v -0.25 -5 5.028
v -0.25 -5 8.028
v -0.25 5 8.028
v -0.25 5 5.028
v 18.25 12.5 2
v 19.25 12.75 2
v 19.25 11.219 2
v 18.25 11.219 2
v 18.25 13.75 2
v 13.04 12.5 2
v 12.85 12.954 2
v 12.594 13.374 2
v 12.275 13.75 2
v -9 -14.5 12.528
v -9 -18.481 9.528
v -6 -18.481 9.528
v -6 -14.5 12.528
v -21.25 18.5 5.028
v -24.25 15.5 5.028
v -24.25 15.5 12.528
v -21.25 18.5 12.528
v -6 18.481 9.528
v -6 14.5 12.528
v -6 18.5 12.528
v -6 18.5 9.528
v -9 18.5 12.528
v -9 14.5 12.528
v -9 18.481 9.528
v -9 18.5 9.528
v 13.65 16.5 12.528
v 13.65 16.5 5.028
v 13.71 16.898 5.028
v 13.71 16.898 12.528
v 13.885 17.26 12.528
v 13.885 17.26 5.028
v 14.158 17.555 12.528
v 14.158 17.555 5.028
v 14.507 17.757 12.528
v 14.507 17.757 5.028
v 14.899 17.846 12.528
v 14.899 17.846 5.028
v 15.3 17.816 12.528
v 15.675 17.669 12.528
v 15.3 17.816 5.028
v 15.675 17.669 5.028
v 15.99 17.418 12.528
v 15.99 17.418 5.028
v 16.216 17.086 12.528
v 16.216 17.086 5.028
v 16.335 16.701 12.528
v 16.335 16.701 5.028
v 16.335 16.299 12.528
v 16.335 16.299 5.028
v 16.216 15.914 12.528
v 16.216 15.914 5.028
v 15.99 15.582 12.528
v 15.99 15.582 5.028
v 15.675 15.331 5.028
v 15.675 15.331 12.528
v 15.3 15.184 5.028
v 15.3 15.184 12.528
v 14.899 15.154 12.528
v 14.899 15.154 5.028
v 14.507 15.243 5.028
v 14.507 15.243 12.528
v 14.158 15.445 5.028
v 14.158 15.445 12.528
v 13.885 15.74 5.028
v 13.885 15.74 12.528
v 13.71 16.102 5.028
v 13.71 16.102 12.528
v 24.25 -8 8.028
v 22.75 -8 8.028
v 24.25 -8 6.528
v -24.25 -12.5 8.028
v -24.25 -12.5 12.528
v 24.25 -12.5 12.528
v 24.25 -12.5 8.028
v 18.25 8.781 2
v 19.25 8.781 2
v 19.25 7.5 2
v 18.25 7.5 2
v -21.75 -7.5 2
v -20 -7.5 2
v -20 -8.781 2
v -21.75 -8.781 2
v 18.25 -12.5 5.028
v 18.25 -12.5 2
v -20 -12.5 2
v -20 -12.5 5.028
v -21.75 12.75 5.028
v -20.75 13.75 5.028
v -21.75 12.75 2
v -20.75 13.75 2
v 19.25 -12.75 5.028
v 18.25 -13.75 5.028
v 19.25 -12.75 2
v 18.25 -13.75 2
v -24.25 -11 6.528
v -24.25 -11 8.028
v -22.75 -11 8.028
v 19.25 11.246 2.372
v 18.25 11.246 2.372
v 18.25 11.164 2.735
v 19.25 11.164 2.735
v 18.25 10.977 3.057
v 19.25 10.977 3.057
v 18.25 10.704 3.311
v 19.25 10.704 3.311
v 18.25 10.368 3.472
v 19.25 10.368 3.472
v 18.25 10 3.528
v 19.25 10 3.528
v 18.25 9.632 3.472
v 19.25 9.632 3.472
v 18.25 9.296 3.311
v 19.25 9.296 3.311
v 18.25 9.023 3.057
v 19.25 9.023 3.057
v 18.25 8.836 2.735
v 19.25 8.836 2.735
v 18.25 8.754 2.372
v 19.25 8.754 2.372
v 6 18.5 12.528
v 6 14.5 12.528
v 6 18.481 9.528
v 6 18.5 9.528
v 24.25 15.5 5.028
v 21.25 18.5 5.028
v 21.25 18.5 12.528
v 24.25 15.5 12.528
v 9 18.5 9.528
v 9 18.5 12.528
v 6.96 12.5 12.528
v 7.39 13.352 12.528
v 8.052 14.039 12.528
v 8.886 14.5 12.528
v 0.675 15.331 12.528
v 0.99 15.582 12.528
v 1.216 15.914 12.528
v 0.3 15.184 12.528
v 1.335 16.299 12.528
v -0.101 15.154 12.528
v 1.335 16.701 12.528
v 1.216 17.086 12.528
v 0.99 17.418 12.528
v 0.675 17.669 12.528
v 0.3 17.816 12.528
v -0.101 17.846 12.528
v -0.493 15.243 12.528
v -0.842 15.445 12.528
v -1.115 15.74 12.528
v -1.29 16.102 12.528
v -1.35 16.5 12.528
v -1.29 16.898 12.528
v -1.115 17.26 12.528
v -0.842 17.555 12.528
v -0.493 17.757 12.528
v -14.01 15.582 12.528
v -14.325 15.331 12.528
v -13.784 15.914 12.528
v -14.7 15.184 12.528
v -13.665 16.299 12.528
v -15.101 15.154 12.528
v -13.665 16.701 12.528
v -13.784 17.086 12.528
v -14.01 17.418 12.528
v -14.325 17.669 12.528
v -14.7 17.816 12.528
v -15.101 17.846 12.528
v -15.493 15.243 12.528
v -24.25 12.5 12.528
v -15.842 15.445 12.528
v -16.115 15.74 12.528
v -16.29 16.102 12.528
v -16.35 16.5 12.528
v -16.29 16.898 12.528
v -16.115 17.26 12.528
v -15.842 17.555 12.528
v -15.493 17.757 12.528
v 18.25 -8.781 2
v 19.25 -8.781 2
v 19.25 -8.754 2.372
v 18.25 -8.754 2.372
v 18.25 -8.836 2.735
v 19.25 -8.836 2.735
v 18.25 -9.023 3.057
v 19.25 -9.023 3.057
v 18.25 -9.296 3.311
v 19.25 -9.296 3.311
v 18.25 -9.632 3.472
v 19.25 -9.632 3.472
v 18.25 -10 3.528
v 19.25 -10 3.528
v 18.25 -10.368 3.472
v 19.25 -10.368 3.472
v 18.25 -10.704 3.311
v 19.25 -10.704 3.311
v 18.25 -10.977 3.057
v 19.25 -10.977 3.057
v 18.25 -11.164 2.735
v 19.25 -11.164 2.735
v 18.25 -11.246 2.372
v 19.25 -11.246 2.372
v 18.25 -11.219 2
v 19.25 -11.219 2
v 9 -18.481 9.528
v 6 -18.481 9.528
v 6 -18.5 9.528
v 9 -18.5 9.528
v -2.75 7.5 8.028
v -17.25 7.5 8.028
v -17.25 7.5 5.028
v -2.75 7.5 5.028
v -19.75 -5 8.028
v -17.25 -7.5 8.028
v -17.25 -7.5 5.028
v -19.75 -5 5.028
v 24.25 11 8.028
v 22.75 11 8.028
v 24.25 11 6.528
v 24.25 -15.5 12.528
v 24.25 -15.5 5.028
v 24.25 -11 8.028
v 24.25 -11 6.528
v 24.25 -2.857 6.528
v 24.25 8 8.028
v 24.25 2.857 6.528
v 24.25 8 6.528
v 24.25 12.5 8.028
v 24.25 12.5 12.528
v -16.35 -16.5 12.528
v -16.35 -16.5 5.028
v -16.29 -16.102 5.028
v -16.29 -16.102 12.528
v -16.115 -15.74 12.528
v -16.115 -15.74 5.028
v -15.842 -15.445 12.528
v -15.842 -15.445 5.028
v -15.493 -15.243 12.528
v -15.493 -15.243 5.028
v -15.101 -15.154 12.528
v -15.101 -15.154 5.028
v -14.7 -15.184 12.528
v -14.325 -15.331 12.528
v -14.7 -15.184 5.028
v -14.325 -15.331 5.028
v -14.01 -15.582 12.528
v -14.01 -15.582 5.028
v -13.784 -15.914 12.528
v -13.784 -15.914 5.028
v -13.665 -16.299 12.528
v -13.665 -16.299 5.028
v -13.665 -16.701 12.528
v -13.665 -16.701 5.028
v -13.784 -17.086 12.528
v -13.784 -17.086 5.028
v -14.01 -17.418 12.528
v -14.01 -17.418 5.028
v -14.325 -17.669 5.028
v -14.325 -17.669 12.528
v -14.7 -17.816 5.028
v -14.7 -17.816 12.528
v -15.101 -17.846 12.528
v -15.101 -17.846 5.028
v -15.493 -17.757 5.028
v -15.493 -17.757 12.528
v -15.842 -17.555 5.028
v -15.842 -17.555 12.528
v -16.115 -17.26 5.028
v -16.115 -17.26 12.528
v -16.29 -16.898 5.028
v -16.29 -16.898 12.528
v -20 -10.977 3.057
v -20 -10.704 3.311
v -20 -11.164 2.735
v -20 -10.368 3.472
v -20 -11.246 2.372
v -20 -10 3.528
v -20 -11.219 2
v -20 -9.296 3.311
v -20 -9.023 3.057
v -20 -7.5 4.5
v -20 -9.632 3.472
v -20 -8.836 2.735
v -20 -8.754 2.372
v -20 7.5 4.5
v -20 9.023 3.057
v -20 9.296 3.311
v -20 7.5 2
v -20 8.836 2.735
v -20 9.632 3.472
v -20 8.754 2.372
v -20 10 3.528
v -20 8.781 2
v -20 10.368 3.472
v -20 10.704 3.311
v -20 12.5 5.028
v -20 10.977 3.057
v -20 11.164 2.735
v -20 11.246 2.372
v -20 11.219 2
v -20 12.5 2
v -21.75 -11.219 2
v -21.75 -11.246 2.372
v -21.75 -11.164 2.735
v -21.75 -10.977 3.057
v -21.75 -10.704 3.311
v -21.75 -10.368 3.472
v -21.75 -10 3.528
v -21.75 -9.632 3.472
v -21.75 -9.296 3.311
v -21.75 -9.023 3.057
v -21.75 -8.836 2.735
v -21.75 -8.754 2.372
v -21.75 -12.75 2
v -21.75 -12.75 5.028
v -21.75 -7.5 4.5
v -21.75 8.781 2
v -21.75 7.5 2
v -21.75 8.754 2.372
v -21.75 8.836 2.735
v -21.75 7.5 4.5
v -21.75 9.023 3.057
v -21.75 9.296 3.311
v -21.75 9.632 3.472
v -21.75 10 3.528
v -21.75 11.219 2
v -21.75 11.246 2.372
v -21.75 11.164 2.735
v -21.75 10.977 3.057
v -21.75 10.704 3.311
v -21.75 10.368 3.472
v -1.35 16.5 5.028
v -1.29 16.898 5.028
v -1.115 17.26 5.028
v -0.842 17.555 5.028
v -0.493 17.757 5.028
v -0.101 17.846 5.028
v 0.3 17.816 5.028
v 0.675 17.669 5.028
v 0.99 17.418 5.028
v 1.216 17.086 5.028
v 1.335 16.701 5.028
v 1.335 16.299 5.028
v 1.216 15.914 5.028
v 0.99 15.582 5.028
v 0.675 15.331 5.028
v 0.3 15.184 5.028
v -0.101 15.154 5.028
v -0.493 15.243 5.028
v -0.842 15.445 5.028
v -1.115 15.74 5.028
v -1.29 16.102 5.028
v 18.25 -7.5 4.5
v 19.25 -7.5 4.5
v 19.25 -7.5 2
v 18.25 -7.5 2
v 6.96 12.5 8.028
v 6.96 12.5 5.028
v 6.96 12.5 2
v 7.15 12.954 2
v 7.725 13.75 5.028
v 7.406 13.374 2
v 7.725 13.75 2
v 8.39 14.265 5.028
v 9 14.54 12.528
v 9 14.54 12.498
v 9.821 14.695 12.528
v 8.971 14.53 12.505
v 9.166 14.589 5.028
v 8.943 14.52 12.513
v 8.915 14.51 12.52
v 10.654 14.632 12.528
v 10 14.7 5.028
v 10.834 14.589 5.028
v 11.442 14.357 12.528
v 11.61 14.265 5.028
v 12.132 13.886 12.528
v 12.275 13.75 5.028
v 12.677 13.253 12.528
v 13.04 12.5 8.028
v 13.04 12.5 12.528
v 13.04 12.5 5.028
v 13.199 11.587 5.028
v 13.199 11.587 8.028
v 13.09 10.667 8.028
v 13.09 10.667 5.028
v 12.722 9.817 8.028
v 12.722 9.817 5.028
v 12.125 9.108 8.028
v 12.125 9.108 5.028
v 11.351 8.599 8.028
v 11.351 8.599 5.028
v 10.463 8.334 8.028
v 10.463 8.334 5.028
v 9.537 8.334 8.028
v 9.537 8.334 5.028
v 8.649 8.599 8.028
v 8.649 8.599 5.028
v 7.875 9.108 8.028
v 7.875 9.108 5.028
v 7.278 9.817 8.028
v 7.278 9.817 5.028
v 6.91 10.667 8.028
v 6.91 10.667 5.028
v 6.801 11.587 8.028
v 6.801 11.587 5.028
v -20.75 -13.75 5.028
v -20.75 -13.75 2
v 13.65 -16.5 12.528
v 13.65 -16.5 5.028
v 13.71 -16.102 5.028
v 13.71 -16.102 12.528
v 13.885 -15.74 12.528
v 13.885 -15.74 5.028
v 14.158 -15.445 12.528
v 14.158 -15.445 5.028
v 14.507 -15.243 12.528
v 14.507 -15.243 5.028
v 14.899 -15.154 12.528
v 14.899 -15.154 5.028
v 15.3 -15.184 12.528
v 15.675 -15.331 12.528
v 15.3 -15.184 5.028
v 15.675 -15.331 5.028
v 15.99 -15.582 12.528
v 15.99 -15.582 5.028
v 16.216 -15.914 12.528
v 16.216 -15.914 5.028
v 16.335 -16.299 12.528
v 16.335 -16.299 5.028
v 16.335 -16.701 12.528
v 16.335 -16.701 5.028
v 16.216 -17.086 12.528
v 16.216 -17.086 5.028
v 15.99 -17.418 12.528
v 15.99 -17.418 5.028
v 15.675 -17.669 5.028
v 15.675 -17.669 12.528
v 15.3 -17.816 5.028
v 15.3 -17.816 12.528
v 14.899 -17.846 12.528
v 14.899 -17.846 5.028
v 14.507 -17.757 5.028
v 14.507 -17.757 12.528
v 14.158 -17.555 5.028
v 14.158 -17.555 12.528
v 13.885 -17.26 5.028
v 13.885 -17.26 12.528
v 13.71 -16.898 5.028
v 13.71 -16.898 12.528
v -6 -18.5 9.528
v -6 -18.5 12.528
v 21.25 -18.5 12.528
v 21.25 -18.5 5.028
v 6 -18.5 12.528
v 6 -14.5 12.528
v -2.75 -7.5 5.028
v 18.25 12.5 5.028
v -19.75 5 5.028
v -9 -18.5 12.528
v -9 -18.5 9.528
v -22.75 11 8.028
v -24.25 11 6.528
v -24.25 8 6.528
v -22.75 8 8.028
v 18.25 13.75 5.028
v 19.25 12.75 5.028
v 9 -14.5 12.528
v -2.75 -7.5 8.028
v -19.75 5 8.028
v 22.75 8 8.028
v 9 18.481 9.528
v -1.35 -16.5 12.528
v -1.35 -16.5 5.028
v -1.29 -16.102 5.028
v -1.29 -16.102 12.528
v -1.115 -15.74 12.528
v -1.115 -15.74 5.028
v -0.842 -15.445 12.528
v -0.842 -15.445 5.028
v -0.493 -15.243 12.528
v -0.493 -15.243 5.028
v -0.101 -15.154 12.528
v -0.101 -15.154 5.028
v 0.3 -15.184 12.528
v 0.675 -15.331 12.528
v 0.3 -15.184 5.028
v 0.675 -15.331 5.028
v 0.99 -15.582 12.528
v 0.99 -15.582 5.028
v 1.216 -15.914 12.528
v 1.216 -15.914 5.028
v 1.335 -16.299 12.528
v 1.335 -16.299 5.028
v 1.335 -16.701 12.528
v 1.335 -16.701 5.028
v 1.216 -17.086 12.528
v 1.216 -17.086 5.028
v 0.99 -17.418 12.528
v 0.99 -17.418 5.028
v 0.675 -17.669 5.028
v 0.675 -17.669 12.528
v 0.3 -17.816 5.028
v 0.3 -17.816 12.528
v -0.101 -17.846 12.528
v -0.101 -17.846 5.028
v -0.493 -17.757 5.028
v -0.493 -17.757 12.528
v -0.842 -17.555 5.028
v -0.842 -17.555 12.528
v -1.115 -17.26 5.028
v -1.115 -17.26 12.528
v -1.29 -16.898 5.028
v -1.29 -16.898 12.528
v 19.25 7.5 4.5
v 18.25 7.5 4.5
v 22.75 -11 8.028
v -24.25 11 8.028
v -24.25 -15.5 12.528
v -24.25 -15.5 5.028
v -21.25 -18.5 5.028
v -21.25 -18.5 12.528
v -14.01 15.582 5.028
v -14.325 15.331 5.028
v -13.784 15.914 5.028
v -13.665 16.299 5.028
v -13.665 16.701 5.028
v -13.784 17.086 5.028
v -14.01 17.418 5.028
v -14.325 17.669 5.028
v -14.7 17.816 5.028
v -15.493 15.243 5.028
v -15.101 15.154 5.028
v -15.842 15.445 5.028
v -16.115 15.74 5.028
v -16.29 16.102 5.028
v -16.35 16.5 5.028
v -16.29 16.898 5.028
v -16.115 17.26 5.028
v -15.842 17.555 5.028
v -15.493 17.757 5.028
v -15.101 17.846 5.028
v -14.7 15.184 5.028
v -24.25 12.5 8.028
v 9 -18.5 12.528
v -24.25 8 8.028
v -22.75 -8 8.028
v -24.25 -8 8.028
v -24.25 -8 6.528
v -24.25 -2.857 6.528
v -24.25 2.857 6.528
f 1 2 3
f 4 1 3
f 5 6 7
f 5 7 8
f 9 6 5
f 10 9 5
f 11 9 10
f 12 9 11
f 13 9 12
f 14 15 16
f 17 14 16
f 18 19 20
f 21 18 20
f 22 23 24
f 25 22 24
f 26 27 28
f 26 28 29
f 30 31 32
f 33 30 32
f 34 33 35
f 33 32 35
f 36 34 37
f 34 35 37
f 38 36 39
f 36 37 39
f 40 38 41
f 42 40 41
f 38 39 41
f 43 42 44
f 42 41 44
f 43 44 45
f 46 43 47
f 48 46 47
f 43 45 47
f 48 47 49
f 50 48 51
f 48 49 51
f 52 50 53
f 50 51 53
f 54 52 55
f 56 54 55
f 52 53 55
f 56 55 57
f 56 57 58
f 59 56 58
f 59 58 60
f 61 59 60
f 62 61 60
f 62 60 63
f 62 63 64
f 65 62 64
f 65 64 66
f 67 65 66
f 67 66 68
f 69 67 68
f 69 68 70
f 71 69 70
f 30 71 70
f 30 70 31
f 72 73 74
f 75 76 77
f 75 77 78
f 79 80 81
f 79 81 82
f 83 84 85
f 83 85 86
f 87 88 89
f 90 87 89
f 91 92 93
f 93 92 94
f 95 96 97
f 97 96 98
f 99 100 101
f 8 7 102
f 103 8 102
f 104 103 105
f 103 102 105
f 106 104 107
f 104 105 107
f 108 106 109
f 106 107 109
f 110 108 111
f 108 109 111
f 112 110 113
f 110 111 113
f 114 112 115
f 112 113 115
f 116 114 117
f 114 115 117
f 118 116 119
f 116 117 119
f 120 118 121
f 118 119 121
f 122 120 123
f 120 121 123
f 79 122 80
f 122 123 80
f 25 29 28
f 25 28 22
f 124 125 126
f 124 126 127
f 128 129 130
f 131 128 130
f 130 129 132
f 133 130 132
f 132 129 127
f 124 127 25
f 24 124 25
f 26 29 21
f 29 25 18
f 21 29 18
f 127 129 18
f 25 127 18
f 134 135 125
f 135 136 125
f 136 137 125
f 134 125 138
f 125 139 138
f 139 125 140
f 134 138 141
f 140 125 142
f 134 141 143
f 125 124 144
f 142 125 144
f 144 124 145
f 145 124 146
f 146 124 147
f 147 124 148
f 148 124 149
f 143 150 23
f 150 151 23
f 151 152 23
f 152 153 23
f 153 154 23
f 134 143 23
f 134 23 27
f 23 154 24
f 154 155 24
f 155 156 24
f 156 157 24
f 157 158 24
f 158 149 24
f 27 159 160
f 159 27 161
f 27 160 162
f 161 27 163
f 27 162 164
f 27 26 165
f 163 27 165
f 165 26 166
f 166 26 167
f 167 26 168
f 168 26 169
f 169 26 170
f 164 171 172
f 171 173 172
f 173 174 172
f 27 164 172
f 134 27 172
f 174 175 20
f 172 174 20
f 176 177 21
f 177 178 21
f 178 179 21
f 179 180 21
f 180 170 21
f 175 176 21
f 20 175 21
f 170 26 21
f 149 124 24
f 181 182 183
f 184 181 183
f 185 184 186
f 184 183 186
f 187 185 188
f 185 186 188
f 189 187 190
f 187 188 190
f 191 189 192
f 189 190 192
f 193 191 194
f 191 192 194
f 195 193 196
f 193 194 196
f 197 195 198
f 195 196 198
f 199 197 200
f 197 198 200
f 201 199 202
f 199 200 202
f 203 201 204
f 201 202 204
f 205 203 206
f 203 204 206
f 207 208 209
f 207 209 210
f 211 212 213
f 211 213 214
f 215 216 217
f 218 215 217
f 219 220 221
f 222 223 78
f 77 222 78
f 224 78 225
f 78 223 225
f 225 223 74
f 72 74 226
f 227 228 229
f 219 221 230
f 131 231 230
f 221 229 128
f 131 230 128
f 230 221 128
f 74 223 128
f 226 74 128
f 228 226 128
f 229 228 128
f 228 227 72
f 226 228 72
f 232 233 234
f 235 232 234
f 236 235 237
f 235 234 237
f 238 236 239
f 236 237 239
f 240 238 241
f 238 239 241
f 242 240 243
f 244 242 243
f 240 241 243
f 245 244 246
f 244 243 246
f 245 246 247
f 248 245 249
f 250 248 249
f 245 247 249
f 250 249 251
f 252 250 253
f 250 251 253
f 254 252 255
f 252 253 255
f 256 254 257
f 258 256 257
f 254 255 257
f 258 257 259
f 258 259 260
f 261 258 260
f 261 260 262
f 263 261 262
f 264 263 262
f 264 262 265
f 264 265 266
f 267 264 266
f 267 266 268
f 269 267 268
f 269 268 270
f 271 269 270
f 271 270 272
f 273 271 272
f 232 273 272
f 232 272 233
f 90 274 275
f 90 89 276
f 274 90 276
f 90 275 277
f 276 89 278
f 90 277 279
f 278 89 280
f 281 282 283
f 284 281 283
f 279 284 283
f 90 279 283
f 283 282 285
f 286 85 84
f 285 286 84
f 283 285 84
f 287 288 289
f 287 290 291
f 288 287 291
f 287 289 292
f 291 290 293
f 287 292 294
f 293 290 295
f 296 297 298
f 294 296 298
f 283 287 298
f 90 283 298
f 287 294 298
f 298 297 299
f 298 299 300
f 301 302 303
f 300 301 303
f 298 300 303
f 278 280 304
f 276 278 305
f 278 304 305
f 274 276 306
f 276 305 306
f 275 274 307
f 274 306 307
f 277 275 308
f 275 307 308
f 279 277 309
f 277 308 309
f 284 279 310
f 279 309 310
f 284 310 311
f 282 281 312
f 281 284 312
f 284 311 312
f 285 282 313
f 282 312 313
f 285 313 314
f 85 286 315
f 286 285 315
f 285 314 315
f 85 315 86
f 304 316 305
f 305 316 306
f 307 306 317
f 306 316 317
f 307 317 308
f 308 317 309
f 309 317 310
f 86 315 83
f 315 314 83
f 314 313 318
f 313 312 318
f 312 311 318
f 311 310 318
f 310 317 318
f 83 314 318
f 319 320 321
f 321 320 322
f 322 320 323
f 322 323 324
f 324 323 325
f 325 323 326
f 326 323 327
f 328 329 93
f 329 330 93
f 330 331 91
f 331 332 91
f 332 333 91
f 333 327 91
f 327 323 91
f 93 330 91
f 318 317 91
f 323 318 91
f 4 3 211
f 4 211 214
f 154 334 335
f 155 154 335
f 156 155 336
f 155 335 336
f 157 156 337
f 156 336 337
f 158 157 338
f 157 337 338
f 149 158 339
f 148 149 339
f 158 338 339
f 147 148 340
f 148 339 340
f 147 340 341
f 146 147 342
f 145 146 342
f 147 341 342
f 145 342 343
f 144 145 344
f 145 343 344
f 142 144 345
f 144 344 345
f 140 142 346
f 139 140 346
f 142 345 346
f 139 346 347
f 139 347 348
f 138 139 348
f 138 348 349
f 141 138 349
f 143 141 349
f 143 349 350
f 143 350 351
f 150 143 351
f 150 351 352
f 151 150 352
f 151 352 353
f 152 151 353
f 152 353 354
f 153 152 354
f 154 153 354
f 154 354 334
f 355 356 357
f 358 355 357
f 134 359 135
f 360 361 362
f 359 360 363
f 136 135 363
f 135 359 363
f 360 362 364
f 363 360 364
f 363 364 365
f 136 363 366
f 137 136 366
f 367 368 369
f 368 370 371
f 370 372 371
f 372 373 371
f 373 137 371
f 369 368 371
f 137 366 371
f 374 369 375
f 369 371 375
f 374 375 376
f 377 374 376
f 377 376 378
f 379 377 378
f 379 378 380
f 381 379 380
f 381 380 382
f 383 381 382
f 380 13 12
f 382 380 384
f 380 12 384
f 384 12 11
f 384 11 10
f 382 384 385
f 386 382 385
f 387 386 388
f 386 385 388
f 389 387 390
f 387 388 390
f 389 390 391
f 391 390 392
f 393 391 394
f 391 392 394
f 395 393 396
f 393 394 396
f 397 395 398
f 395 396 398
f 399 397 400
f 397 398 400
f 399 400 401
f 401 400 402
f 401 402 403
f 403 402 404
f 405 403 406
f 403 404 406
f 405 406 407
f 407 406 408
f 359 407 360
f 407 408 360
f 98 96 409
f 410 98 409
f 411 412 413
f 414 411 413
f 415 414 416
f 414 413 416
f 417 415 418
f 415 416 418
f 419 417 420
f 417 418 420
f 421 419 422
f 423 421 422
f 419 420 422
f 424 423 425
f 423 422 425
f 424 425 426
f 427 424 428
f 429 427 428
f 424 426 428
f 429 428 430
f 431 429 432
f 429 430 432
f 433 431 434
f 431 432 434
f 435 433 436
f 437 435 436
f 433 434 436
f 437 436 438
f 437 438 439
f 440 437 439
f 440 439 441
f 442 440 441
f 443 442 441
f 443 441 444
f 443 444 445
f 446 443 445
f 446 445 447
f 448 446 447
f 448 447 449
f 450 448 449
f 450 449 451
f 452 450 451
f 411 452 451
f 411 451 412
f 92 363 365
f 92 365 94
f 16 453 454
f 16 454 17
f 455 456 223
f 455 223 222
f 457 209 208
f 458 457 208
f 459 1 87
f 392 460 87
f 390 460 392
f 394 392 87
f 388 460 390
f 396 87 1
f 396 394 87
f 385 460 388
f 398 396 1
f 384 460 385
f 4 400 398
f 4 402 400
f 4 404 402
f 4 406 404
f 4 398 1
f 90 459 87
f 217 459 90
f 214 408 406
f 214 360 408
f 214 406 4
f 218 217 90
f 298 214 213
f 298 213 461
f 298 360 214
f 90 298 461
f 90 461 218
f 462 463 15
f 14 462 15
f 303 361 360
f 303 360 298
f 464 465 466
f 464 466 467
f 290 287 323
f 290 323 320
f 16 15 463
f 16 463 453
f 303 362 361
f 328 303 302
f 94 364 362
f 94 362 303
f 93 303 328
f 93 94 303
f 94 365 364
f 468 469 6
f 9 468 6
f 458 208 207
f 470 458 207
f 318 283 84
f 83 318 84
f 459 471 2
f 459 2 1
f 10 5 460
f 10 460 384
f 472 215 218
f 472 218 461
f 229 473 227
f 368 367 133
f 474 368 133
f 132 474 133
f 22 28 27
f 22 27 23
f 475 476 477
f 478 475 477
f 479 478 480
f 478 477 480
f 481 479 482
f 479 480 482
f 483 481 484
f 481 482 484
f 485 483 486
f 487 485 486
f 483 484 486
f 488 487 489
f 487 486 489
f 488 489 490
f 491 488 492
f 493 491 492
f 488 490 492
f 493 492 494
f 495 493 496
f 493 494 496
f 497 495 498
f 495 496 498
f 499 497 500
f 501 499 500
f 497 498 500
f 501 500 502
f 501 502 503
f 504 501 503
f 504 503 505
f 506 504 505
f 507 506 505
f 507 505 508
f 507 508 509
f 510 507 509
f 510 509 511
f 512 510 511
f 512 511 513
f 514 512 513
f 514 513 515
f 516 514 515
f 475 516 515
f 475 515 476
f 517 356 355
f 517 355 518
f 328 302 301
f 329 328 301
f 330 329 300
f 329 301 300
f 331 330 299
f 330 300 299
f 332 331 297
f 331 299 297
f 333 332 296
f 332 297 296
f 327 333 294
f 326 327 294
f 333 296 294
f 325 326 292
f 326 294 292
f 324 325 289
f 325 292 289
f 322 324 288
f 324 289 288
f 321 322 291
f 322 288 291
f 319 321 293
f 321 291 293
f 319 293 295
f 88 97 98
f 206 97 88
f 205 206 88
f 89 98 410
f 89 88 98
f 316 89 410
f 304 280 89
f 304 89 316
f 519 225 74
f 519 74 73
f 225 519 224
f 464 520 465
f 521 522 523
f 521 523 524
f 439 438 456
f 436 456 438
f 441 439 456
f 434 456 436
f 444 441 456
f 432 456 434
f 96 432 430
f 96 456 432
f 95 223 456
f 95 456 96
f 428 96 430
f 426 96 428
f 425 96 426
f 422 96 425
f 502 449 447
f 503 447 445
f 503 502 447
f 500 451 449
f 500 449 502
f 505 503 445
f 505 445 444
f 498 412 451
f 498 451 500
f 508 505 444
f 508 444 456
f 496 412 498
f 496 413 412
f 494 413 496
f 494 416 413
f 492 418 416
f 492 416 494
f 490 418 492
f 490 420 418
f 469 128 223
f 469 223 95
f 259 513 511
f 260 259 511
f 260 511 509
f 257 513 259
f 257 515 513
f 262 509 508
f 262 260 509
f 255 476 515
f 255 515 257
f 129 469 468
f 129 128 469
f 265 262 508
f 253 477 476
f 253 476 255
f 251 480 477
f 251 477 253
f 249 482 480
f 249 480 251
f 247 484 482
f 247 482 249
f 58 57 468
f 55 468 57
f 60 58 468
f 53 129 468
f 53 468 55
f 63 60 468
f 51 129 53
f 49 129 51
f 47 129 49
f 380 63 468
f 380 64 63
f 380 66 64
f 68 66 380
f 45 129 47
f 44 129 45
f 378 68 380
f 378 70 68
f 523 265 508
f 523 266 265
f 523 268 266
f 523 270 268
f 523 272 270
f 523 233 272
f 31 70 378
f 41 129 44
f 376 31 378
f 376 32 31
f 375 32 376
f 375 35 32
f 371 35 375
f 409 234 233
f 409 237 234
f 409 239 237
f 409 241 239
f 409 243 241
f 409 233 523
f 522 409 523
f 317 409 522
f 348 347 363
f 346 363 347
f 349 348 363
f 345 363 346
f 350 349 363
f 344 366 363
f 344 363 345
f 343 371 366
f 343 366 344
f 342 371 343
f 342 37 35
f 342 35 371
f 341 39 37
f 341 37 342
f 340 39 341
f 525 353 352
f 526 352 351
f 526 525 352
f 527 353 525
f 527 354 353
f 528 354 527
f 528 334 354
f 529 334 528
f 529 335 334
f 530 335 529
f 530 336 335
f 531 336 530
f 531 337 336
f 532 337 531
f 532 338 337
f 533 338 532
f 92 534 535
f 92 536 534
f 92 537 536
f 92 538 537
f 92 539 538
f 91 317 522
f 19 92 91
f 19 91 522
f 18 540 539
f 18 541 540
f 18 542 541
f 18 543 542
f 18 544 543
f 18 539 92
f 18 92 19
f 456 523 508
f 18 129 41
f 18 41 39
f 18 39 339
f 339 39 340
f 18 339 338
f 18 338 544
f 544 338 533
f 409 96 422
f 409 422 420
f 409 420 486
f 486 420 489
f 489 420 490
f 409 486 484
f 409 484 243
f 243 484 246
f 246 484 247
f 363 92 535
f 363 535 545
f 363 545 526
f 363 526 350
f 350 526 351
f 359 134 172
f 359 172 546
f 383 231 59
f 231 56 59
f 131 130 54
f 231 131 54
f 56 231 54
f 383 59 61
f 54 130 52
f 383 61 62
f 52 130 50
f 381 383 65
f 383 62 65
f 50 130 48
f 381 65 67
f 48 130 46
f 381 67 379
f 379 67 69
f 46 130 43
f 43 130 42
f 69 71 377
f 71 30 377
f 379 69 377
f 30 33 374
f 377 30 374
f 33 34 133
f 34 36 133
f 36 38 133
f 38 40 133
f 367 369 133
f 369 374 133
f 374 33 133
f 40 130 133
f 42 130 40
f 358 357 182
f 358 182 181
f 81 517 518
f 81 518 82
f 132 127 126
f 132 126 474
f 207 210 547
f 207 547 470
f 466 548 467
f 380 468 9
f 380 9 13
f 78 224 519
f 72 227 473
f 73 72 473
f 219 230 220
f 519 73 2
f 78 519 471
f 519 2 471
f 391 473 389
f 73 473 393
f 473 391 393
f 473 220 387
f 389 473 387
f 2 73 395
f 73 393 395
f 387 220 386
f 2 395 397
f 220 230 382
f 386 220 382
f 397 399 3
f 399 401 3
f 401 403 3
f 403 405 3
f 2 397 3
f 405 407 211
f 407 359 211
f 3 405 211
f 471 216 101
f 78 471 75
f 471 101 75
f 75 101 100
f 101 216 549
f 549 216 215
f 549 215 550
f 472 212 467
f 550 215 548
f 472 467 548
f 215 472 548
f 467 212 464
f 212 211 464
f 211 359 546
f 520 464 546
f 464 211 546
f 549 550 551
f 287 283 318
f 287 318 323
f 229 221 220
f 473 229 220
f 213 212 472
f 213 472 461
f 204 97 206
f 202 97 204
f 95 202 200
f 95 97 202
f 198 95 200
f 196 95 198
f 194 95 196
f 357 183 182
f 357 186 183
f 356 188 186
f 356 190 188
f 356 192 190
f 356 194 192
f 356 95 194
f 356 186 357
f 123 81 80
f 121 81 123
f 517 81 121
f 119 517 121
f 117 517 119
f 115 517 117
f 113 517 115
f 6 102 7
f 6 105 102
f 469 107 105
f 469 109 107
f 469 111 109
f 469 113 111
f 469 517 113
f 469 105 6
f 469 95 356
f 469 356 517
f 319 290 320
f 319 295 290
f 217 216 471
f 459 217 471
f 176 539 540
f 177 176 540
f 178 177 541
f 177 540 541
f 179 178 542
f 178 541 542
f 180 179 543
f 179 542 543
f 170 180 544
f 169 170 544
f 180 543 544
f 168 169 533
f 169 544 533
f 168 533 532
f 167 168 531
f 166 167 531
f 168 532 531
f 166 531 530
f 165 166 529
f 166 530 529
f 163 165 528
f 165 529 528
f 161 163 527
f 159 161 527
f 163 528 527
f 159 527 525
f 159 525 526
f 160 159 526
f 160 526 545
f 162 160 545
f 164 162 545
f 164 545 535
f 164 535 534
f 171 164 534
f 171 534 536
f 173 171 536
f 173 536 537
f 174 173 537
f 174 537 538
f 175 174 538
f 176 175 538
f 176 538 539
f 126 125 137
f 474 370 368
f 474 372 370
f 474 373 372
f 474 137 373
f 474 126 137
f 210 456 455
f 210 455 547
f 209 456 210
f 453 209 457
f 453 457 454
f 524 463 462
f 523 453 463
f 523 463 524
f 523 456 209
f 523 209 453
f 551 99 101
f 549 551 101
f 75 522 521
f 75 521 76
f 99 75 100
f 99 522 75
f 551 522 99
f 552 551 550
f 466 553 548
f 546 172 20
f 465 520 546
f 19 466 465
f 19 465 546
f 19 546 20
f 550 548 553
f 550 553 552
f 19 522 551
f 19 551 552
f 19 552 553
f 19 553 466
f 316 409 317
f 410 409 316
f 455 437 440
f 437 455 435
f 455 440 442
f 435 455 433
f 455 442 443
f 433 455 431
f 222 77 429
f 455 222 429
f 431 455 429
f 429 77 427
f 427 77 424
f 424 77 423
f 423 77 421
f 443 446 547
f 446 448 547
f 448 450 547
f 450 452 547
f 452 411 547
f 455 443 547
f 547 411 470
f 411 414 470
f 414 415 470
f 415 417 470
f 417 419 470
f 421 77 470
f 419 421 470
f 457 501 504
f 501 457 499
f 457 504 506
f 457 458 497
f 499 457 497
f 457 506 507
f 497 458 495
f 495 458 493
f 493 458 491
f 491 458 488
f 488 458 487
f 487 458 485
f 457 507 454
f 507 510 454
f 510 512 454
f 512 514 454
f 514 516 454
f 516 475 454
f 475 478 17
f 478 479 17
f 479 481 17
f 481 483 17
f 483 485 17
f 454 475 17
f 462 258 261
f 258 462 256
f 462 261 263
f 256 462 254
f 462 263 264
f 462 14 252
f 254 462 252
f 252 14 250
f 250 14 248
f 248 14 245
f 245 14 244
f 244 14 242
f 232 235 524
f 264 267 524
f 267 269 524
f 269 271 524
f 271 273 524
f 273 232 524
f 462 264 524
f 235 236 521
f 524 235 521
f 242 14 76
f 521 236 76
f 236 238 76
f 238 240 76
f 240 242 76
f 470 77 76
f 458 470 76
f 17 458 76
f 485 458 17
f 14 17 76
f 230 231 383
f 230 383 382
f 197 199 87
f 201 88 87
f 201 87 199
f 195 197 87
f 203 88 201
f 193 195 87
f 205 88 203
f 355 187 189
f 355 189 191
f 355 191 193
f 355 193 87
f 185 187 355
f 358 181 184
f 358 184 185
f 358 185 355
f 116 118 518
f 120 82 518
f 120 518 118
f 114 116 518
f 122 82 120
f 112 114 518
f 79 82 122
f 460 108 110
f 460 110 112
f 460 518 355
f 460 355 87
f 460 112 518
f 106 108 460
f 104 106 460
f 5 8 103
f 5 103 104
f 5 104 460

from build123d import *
from OCP.BRepFilletAPI import BRepFilletAPI_MakeChamfer

# Parameters (mm, degrees)
SKETCH_1_W                  = 48.5
SKETCH_1_H                  = 37
EXTRUDE_1_DEPTH             = 7.5
SKETCH_2_W                  = 4.5
SKETCH_2_H                  = 25
CUT_EXTRUDE_1_DEPTH         = 54.398977368
SKETCH_3_W                  = 41
SKETCH_3_H                  = 27.5
EXTRUDE_2_DEPTH             = 3.028
SKETCH_4_W                  = 38.25
SKETCH_4_H                  = 25
CUT_EXTRUDE_2_DEPTH         = 3.028
CUT_EXTRUDE_3_DEPTH         = 49.015109955
CUT_EXTRUDE_4_DEPTH         = 52.139033859
CUT_EXTRUDE_5_DEPTH         = 32.090983966
HOLE_WIZARD_2_5_2_5_1_D     = 2.5
HOLE_WIZARD_2_5_2_5_1_DEPTH = 1.75
HOLE_WIZARD_2_5_2_5_2_D     = 2.5
HOLE_WIZARD_2_5_2_5_2_DEPTH = 6
HOLE_WIZARD_2_5_2_5_3_D     = 2.5
HOLE_WIZARD_2_5_2_5_3_DEPTH = 4.25
HOLE_WIZARD_2_7_2_7_1_D     = 2.7
CHAMFER_1_SIZE              = 3
SKETCH_17_W                 = 3
SKETCH_17_H                 = 4
CUT_EXTRUDE_8_DEPTH         = 3
CHAMFER_2_SIZE              = 3
CHAMFER_2_SIZE_2            = 3.981134465
SKETCH_19_W                 = 2
SKETCH_19_H                 = 3
CUT_EXTRUDE_9_DEPTH         = 1.5
CHAMFER_3_SIZE              = 2
CHAMFER_4_SIZE              = 1
SKETCH_20_R                 = 3.2
CUT_EXTRUDE_10_DEPTH        = 21.5
SKETCH_21_W                 = 19.5
SKETCH_21_H                 = 15
CUT_EXTRUDE_11_DEPTH        = 21.5
CHAMFER_5_SIZE              = 2.5
SKETCH_22_W                 = 9
SKETCH_22_H                 = 15
CUT_EXTRUDE_12_DEPTH        = 51.5


# Some blends are built 0.0001 mm under size
with BuildPart() as part:
    # 草图1 → 凸台-拉伸1 (new body)
    with BuildSketch(Plane(origin=(0, 0, 5.028), x_dir=(-1, 0, 0), z_dir=(0, 0, -1))):
        Rectangle(SKETCH_1_W, SKETCH_1_H)
    extrude(amount=-EXTRUDE_1_DEPTH)

    # 草图2 → 切除-拉伸1 (cut, through all)
    with BuildSketch(Plane(origin=(24.25, 0, 0), x_dir=(0, 0, -1), z_dir=(1, 0, 0))):
        with Locations((-10.278, 0)):
            Rectangle(SKETCH_2_W, SKETCH_2_H)
    extrude(amount=-CUT_EXTRUDE_1_DEPTH, mode=Mode.SUBTRACT)

    # 草图3 → 凸台-拉伸2 (add)
    with BuildSketch(Plane(origin=(0, 0, 5.028), x_dir=(-1, 0, 0), z_dir=(0, 0, -1))):
        with Locations((1.25, 0)):
            Rectangle(SKETCH_3_W, SKETCH_3_H)
    extrude(amount=EXTRUDE_2_DEPTH)

    # 草图4 → 切除-拉伸2 (cut)
    with BuildSketch(Plane(origin=(0, 0, 2), x_dir=(-1, 0, 0), z_dir=(0, 0, -1))):
        with Locations((0.875, 0)):
            Rectangle(SKETCH_4_W, SKETCH_4_H)
    extrude(amount=-CUT_EXTRUDE_2_DEPTH, mode=Mode.SUBTRACT)

    # 草图5 → 切除-拉伸3 (cut, through all)
    with BuildSketch(Plane.ZY.offset(-18.25)):
        with BuildLine():
            Line((2, 7.034395212), (2, -7.034395212))
            ThreePointArc((2, -7.034395212), (4.278, 0), (2, 7.034395212))
        make_face()
    extrude(amount=-CUT_EXTRUDE_3_DEPTH, mode=Mode.SUBTRACT)

    # 草图6 → 切除-拉伸4 (cut, through all)
    with BuildSketch(Plane.ZY.offset(21.75)):
        with BuildLine():
            Line((2, 7.034395212), (2, -7.034395212))
            ThreePointArc((2, -7.034395212), (4.278, 0), (2, 7.034395212))
        make_face()
    extrude(amount=-CUT_EXTRUDE_4_DEPTH, mode=Mode.SUBTRACT)

    # 草图7 → 切除-拉伸5 (cut, through all)
    with BuildSketch(Plane.XY.offset(8.028)):
        with BuildLine():
            Line((-7.978419869, 7.029222073), (-13.021580131, 7.029222073))
            ThreePointArc((-13.021580131, 7.029222073), (-17.801221513, 4.934335949), (-19.5, 0))
            ThreePointArc((-19.5, 0), (-17.801221513, -4.934335949), (-13.021580131, -7.029222073))
            Line((-13.021580131, -7.029222073), (-7.978419869, -7.029222073))
            ThreePointArc((-7.978419869, -7.029222073), (-3.198778487, -4.934335949), (-1.5, 0))
            ThreePointArc((-1.5, 0), (-3.198778487, 4.934335949), (-7.978419869, 7.029222073))
        make_face()
    extrude(amount=-CUT_EXTRUDE_5_DEPTH, mode=Mode.SUBTRACT)

    # Ø2.5 (2.5) 直径孔1
    with Locations(Plane.ZY.offset(21.75)):
        with Locations((2.278, 10)):
            Hole(HOLE_WIZARD_2_5_2_5_1_D / 2, depth=HOLE_WIZARD_2_5_2_5_1_DEPTH)

    # Ø2.5 (2.5) 直径孔2
    with Locations(Plane.ZY.offset(-18.25)):
        with Locations((2.278, -10), (2.278, 10)):
            Hole(HOLE_WIZARD_2_5_2_5_2_D / 2, depth=HOLE_WIZARD_2_5_2_5_2_DEPTH)

    # Ø2.5 (2.5) 直径孔3
    with Locations(Plane(origin=(-20, 0, 0), x_dir=(0, 0, -1), z_dir=(1, 0, 0))):
        with Locations((-2.278, -10)):
            Hole(HOLE_WIZARD_2_5_2_5_3_D / 2, depth=HOLE_WIZARD_2_5_2_5_3_DEPTH)

    # Ø2.7 (2.7) 直径孔1 (through all)
    with Locations(Plane.XY.offset(12.528)):
        with Locations((0, -16.5), (-15, -16.5), (15, -16.5), (0, 16.5), (-15, 16.5), (15, 16.5)):
            Hole(HOLE_WIZARD_2_7_2_7_1_D / 2)

    # 倒角1
    chamfer_1_edges = [part.edges().sort_by_distance(p)[0] for p in [
        (-24.25, 18.5, 8.778),
        (-24.25, -18.5, 8.778),
        (24.25, -18.5, 8.778),
        (24.25, 18.5, 8.778),
    ]]
    chamfer(chamfer_1_edges, length=CHAMFER_1_SIZE)

    # 草图17 → 切除-拉伸8 (cut)
    with BuildSketch(Plane.XY.offset(12.528)):
        with Locations((-7.5, -16.5)):
            Rectangle(SKETCH_17_W, SKETCH_17_H)
        with Locations((7.5, -16.5)):
            Rectangle(SKETCH_17_W, SKETCH_17_H)
        with Locations((7.5, 16.5)):
            Rectangle(SKETCH_17_W, SKETCH_17_H)
        with Locations((-7.5, 16.5)):
            Rectangle(SKETCH_17_W, SKETCH_17_H)
    extrude(amount=-CUT_EXTRUDE_8_DEPTH, mode=Mode.SUBTRACT)

    # 倒角2
    chamfer_2_edges_1 = [part.edges().sort_by_distance(p)[0] for p in [
        (7.5, -14.5, 9.528),
    ]]
    chamfer_2_side_1 = [part.faces().sort_by_distance(p)[0] for p in [
        (7.5, -14.5, 9.588),
    ]]
    chamfer_2_edges_2 = [part.edges().sort_by_distance(p)[0] for p in [
        (-7.5, -14.5, 9.528),
    ]]
    chamfer_2_side_2 = [part.faces().sort_by_distance(p)[0] for p in [
        (-7.5, -14.5, 9.588),
    ]]
    chamfer_2_edges_3 = [part.edges().sort_by_distance(p)[0] for p in [
        (-7.5, 14.5, 9.528),
    ]]
    chamfer_2_side_3 = [part.faces().sort_by_distance(p)[0] for p in [
        (-7.5, 14.5, 9.588),
    ]]
    chamfer_2_edges_4 = [part.edges().sort_by_distance(p)[0] for p in [
        (7.5, 14.5, 9.528),
    ]]
    chamfer_2_side_4 = [part.faces().sort_by_distance(p)[0] for p in [
        (7.5, 14.5, 9.588),
    ]]
    chamfer_2 = BRepFilletAPI_MakeChamfer(part.part.solid().wrapped)
    for e in chamfer_2_edges_1:
        chamfer_2.Add(CHAMFER_2_SIZE - 0.0001, CHAMFER_2_SIZE_2 - 0.0001, e.wrapped, chamfer_2_side_1[0].wrapped)
    for e in chamfer_2_edges_2:
        chamfer_2.Add(CHAMFER_2_SIZE - 0.0001, CHAMFER_2_SIZE_2 - 0.0001, e.wrapped, chamfer_2_side_2[0].wrapped)
    for e in chamfer_2_edges_3:
        chamfer_2.Add(CHAMFER_2_SIZE - 0.0001, CHAMFER_2_SIZE_2 - 0.0001, e.wrapped, chamfer_2_side_3[0].wrapped)
    for e in chamfer_2_edges_4:
        chamfer_2.Add(CHAMFER_2_SIZE - 0.0001, CHAMFER_2_SIZE_2 - 0.0001, e.wrapped, chamfer_2_side_4[0].wrapped)
    add(Compound.cast(chamfer_2.Shape()), mode=Mode.REPLACE)  # a hair under: the kernel refuses the full size

    # 草图19 → 切除-拉伸9 (cut)
    with BuildSketch(Plane.XY.offset(8.028)):
        with Locations((-23.25, -9.5)):
            Rectangle(SKETCH_19_W, SKETCH_19_H)
        with Locations((-23.25, 9.5)):
            Rectangle(SKETCH_19_W, SKETCH_19_H)
        with Locations((23.25, 9.5)):
            Rectangle(SKETCH_19_W, SKETCH_19_H)
        with Locations((23.25, -9.5)):
            Rectangle(SKETCH_19_W, SKETCH_19_H)
    extrude(amount=-CUT_EXTRUDE_9_DEPTH, mode=Mode.SUBTRACT)

    # 倒角3
    # the kernel refuses this chamfer: 2 mm, written as the material it adds along each edge
    with BuildSketch(Plane(origin=(22.25, 11, 6.528), x_dir=(0.9996219169112968, 0, -0.02749587661058651), z_dir=(0, -1, 0))) as chamfer_3_piece_1_section:
        Polygon((CHAMFER_3_SIZE * 0.999621916911, CHAMFER_3_SIZE * 0.0274958766106), (-CHAMFER_3_SIZE * 0.0274958766106, CHAMFER_3_SIZE * 0.999621916911), (0, 0), align=None)
    chamfer_3_piece_1 = extrude(amount=8.143365976, mode=Mode.PRIVATE)
    chamfer_3_piece_1 = split(chamfer_3_piece_1, bisect_by=Plane(origin=(22.95, 9.5, 8.028), z_dir=(0, 0, -1)), keep=Keep.TOP, mode=Mode.PRIVATE)
    add(chamfer_3_piece_1)
    with BuildSketch(Plane(origin=(22.25, -11, 6.528), x_dir=(0.9996219169112968, 0, -0.02749587661058651), z_dir=(0, 1, 0))) as chamfer_3_piece_2_section:
        Polygon((CHAMFER_3_SIZE * 0.999621916911, -CHAMFER_3_SIZE * 0.0274958766106), (-CHAMFER_3_SIZE * 0.0274958766106, -CHAMFER_3_SIZE * 0.999621916911), (0, 0), align=None)
    chamfer_3_piece_2 = extrude(amount=8.143365976, mode=Mode.PRIVATE)
    chamfer_3_piece_2 = split(chamfer_3_piece_2, bisect_by=Plane(origin=(22.95, -9.5, 8.028), z_dir=(0, 0, -1)), keep=Keep.TOP, mode=Mode.PRIVATE)
    add(chamfer_3_piece_2)
    with BuildSketch(Plane(origin=(-22.25, 11, 6.528), x_dir=(-0.9996219169112968, 0, -0.02749587661058651), z_dir=(0, -1, 0))) as chamfer_3_piece_3_section:
        Polygon((CHAMFER_3_SIZE * 0.999621916911, -CHAMFER_3_SIZE * 0.0274958766106), (-CHAMFER_3_SIZE * 0.0274958766106, -CHAMFER_3_SIZE * 0.999621916911), (0, 0), align=None)
    chamfer_3_piece_3 = extrude(amount=8.143365976, mode=Mode.PRIVATE)
    chamfer_3_piece_3 = split(chamfer_3_piece_3, bisect_by=Plane(origin=(-22.95, 9.5, 8.028), z_dir=(0, 0, -1)), keep=Keep.TOP, mode=Mode.PRIVATE)
    add(chamfer_3_piece_3)
    with BuildSketch(Plane(origin=(-22.25, -16.143365976, 6.528), x_dir=(-0.9996219169112968, 0, -0.02749587661058651), z_dir=(0, 1, 0))) as chamfer_3_piece_4_section:
        Polygon((CHAMFER_3_SIZE * 0.999621916911, CHAMFER_3_SIZE * 0.0274958766106), (-CHAMFER_3_SIZE * 0.0274958766106, CHAMFER_3_SIZE * 0.999621916911), (0, 0), align=None)
    chamfer_3_piece_4 = extrude(amount=13.286731952, mode=Mode.PRIVATE)
    chamfer_3_piece_4 = split(chamfer_3_piece_4, bisect_by=Plane(origin=(-22.95, -9.5, 8.028), z_dir=(0, 0, -1)), keep=Keep.TOP, mode=Mode.PRIVATE)
    chamfer_3_piece_4 = split(chamfer_3_piece_4, bisect_by=Plane(origin=(-26.6, -13.15, 7.128), z_dir=(0.7071067811865476, 0.7071067811865476, 0)), keep=Keep.TOP, mode=Mode.PRIVATE)
    add(chamfer_3_piece_4)

    # 倒角4
    chamfer_4_edges = [part.edges().sort_by_distance(p)[0] for p in [
        (-21.75, 13.75, 3.514),
        (19.25, 13.75, 3.514),
        (19.25, -13.75, 3.514),
        (-21.75, -13.75, 3.514),
    ]]
    chamfer(chamfer_4_edges, length=CHAMFER_4_SIZE)

    # 草图20 → 切除-拉伸10 (cut)
    with BuildSketch(Plane(origin=(0, 0, 2), x_dir=(-1, 0, 0), z_dir=(0, 0, -1))):
        with Locations(Location((-10, 11.5, 0), (0, 0, 18.209956864))):
            Circle(SKETCH_20_R)
    extrude(amount=-CUT_EXTRUDE_10_DEPTH, mode=Mode.SUBTRACT)

    # 草图21 → 切除-拉伸11 (cut)
    with BuildSketch(Plane.XY.offset(8.028)):
        with Locations((-10, 0)):
            Rectangle(SKETCH_21_W, SKETCH_21_H)
    extrude(amount=-CUT_EXTRUDE_11_DEPTH, mode=Mode.SUBTRACT)

    # 倒角5
    chamfer_5_edges = [part.edges().sort_by_distance(p)[0] for p in [
        (-0.25, 7.5, 6.528),
        (-0.25, -7.5, 6.528),
        (-19.75, -7.5, 6.528),
        (-19.75, 7.5, 6.528),
    ]]
    chamfer(chamfer_5_edges, length=CHAMFER_5_SIZE)

    # 草图22 → 切除-拉伸12 (cut)
    with BuildSketch(Plane(origin=(19.25, 0, 0), x_dir=(0, 0, -1), z_dir=(1, 0, 0))):
        Rectangle(SKETCH_22_W, SKETCH_22_H)
    extrude(amount=-CUT_EXTRUDE_12_DEPTH, mode=Mode.SUBTRACT)


solid = part.part
